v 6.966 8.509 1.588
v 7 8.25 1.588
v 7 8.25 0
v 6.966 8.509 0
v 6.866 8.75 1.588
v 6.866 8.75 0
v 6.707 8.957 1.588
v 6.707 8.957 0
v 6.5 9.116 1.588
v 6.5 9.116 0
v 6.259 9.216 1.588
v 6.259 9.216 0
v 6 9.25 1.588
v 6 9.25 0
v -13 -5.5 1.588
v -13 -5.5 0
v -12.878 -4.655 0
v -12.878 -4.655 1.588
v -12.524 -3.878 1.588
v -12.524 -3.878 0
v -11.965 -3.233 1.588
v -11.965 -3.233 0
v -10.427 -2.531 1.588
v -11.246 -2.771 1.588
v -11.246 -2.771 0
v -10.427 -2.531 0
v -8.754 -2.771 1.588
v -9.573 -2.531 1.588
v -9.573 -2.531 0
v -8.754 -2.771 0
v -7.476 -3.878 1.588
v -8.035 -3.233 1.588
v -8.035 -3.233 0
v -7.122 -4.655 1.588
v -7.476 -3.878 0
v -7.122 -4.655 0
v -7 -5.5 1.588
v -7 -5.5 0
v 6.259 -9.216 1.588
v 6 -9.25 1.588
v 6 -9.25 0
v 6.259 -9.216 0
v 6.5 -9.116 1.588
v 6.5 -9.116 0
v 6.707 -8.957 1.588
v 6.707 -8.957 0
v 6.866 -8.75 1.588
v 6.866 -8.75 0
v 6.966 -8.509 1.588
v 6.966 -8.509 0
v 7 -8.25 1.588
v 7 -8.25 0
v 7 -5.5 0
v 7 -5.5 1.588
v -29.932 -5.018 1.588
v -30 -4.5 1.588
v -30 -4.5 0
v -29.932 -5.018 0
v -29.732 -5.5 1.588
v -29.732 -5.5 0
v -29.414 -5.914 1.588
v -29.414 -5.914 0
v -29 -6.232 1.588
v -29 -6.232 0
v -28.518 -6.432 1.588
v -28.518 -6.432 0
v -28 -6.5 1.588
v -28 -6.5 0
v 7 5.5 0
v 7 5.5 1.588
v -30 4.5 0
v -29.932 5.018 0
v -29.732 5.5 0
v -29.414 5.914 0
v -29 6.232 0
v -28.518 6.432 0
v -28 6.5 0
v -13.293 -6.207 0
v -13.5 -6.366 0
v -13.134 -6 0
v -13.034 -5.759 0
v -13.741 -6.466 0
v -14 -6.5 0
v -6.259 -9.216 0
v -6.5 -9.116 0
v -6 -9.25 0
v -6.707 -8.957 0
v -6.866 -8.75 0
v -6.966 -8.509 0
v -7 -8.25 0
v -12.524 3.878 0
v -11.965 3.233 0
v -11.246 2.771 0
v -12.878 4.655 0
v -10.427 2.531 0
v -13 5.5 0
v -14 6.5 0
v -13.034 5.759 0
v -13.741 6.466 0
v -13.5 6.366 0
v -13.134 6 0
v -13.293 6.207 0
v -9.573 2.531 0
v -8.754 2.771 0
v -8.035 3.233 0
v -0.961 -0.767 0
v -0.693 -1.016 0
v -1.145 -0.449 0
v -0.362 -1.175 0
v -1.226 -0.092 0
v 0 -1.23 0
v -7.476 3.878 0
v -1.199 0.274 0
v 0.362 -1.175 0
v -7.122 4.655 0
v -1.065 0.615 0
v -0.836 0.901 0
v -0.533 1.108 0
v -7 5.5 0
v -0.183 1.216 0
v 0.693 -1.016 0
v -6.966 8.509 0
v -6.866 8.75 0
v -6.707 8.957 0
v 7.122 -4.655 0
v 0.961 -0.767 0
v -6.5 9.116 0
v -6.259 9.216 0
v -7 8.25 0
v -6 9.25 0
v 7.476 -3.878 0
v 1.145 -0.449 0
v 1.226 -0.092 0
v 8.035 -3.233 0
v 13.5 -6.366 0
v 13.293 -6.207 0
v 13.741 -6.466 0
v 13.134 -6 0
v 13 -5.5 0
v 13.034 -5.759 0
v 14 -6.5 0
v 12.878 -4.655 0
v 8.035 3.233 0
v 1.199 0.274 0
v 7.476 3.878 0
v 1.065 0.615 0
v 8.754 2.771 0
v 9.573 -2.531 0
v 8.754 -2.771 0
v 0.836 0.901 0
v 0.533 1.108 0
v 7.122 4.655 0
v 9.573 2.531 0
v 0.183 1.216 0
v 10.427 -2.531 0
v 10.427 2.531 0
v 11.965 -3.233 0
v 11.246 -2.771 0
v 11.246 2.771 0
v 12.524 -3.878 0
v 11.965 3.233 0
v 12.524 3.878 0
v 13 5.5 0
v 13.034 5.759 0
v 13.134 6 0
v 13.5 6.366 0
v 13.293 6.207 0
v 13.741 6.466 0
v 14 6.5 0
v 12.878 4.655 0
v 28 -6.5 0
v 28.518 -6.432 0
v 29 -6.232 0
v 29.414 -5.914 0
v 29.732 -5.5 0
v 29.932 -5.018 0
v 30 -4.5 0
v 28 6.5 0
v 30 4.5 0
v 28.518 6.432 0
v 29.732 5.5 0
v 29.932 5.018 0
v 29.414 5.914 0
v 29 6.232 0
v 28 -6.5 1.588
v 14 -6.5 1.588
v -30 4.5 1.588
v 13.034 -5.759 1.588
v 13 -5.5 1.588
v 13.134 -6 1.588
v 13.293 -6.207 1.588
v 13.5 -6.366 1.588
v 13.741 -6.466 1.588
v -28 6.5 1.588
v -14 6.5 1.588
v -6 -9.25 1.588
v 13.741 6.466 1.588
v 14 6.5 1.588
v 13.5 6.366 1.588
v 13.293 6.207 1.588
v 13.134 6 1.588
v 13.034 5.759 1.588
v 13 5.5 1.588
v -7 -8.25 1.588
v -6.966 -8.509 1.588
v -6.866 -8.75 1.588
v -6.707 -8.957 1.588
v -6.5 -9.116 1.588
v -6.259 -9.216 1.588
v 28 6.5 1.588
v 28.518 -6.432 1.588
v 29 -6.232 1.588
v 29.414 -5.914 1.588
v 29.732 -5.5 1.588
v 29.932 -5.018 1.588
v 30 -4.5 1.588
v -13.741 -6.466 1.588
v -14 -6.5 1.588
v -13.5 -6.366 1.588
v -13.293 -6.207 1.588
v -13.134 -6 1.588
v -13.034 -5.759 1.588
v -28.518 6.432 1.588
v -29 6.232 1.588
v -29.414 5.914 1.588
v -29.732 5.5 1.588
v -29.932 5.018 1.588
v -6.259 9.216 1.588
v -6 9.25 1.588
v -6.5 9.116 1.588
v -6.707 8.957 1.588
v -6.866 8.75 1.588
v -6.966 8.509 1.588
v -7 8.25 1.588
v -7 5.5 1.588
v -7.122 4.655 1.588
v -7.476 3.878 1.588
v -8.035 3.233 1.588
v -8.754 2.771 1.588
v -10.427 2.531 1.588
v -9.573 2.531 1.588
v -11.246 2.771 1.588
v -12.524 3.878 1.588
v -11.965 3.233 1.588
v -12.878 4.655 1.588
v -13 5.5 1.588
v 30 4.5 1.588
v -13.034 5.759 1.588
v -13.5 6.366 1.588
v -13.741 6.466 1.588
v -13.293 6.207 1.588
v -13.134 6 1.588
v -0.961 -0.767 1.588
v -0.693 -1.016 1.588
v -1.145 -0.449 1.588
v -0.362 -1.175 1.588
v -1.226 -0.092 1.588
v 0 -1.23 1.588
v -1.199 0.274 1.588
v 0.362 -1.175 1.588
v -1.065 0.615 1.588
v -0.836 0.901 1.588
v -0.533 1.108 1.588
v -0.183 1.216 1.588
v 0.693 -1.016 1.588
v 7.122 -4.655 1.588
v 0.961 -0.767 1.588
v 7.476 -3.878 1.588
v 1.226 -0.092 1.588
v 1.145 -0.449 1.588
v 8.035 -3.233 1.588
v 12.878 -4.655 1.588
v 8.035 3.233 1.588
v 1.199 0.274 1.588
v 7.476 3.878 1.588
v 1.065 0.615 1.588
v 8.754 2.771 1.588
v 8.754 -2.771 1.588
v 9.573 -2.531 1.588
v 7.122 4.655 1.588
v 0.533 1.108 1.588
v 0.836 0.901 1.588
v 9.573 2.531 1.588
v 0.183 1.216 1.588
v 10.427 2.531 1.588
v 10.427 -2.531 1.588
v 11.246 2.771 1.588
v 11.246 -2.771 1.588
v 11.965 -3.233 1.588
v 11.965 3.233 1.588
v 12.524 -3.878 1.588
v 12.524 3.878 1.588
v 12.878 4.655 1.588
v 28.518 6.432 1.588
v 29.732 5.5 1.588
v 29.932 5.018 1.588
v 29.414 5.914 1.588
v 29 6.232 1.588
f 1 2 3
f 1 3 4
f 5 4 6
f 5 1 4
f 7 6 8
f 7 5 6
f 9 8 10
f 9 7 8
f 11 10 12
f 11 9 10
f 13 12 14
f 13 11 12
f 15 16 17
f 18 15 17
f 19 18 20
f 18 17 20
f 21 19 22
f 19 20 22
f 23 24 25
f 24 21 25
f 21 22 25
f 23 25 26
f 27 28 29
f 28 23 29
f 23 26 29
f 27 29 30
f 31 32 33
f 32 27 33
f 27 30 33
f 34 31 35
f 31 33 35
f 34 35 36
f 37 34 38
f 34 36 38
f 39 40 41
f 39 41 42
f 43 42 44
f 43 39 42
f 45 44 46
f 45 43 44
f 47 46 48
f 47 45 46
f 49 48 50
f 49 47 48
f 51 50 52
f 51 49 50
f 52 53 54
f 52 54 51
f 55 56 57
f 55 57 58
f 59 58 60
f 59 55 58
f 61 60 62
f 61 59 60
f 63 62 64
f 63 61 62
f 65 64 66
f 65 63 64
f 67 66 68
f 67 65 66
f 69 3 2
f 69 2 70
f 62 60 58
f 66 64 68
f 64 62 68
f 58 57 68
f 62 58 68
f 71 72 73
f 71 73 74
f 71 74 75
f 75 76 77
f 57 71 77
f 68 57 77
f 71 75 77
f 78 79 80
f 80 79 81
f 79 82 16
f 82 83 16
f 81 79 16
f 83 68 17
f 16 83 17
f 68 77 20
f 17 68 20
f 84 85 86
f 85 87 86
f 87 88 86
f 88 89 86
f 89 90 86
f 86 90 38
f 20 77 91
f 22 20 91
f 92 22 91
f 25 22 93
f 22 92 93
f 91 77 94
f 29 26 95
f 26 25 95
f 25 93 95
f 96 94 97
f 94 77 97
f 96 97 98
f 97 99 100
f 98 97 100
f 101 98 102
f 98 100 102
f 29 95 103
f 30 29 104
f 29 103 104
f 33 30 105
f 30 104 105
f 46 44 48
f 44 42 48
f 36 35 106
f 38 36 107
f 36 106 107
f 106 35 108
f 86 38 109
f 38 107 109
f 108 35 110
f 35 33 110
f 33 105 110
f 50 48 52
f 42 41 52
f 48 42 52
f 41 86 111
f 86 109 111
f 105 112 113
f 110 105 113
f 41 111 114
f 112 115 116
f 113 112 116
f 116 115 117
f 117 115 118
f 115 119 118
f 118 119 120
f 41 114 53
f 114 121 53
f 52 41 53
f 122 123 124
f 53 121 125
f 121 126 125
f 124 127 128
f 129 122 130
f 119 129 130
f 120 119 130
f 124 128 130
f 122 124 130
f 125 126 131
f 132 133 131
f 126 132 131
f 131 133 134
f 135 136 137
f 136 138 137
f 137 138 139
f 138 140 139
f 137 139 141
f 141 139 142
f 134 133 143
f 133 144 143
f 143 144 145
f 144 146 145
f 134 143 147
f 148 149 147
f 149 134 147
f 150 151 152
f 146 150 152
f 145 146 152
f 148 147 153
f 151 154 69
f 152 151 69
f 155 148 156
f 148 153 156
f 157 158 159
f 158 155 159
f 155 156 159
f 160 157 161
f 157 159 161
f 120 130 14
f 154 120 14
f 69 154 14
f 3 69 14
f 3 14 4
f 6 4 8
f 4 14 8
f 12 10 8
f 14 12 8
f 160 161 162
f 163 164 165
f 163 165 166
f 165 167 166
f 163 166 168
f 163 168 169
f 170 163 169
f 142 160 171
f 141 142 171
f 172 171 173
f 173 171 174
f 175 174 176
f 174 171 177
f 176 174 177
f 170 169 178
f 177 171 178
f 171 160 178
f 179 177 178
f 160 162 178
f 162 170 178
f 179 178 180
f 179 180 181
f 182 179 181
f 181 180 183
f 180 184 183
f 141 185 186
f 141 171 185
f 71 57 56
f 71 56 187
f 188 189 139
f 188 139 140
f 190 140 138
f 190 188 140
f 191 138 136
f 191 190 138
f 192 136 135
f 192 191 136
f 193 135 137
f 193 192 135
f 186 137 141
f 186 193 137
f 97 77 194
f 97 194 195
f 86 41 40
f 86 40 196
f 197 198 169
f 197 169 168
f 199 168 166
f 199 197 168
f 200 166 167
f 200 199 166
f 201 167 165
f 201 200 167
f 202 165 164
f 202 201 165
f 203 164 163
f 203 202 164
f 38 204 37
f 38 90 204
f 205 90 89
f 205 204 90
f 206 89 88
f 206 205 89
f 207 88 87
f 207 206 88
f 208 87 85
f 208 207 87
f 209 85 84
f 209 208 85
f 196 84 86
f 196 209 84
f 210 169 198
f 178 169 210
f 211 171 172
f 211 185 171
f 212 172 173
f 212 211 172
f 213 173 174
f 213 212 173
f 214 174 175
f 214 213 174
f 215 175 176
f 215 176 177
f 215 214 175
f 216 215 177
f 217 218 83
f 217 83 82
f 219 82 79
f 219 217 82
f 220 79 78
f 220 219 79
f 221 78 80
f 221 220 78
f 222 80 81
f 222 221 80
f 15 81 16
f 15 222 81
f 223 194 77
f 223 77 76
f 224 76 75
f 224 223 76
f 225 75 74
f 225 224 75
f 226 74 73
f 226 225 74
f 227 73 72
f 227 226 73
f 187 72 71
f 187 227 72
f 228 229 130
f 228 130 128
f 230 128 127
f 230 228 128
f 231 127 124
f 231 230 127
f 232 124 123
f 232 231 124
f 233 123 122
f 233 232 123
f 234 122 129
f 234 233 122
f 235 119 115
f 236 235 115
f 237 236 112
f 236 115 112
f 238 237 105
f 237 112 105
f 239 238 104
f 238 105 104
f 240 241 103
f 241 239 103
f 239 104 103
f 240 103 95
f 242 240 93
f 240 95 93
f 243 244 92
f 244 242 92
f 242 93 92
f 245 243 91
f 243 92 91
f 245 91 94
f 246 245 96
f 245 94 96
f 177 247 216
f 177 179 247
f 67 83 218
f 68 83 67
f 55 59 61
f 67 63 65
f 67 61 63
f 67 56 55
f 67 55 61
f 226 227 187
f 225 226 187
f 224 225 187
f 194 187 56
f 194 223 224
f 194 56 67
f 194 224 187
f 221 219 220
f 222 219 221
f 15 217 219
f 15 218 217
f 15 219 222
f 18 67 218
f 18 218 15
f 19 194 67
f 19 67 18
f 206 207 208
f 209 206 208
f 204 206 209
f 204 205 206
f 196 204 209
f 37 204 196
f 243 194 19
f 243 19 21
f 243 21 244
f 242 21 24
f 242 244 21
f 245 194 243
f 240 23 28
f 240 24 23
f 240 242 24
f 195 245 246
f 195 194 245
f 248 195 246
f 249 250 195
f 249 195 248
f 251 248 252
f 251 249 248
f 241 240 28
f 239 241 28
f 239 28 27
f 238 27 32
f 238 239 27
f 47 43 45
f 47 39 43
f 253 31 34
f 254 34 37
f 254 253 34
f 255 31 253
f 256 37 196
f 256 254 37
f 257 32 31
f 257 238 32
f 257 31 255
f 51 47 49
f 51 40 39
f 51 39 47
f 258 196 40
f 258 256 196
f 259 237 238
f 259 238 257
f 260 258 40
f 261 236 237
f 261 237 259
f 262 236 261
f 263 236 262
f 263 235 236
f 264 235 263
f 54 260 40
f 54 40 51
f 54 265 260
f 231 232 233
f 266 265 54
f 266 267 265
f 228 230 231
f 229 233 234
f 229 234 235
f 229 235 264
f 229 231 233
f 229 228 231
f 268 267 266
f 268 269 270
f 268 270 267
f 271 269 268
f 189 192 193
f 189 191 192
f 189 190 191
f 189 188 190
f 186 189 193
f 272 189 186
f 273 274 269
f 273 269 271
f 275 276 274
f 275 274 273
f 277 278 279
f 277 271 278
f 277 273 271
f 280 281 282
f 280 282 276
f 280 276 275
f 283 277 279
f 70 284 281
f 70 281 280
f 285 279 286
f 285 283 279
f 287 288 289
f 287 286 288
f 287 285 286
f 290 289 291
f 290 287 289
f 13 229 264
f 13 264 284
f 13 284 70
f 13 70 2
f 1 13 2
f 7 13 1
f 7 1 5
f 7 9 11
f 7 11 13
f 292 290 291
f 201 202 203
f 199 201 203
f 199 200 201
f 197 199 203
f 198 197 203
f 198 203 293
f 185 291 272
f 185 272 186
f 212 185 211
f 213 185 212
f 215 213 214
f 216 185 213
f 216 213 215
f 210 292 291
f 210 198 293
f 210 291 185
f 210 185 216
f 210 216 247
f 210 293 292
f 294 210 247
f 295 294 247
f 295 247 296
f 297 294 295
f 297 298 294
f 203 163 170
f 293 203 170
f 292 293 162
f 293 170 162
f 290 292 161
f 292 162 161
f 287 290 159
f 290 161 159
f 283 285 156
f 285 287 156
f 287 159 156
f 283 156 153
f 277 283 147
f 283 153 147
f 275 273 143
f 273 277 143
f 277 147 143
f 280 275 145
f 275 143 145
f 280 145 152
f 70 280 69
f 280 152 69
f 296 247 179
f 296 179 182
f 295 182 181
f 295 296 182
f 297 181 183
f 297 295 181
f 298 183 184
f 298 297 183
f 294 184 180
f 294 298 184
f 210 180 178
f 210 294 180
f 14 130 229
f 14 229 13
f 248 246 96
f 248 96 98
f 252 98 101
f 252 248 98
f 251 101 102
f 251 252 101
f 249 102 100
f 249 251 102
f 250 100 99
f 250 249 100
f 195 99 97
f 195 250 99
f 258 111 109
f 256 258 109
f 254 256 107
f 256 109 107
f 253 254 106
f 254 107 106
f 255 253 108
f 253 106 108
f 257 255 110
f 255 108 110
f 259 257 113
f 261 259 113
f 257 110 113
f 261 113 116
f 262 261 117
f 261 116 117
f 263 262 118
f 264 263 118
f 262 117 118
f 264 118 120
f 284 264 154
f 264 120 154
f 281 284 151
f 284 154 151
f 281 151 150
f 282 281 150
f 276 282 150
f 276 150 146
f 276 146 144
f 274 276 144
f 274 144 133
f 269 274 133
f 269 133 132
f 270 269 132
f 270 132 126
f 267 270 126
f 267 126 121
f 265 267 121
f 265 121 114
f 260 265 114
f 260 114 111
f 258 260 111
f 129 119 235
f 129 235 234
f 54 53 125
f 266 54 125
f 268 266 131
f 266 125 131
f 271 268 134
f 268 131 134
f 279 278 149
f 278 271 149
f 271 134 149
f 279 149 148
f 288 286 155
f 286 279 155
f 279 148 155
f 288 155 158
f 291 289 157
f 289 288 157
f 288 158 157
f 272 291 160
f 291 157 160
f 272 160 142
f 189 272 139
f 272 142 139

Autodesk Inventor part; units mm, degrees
ref_plane "YZ Plane" through (0, 0, 0) normal (1, 0, 0) x (0, 1, 0)
ref_plane "XZ Plane" through (0, 0, 0) normal (0, 1, 0) x (-1, 0, 0)
ref_plane "XY Plane" through (0, 0, 0) normal (0, 0, 1) x (1, 0, 0)
sketch "Sketch1" plane through (0, 0, 0) normal (0, 0, 1) x (1, 0, 0)
  line L0 (13.75, -9.25) -> (-13.75, -9.25)
  line L1 (-13.75, -9.25) -> (-13.75, 9.25)
  line L2 (-13.75, 9.25) -> (13.75, 9.25)
  line L3 (13.75, 9.25) -> (13.75, -9.25)
  line L4 (13.75, -9.25) -> (-13.75, 9.25) construction
  line L5 (-13.75, -9.25) -> (13.75, 9.25) construction
  line L6 (-16, 0) -> (16, 0) construction
  circle A0 centre (-16, 0) radius 4
  circle A1 centre (16, 0) radius 4
  line L7 (30, -1) -> (-30, -1)
  line L8 (-30, -1) -> (-30, 1)
  line L9 (-30, 1) -> (30, 1)
  line L10 (30, 1) -> (30, -1)
  line L11 (30, -1) -> (-30, 1) construction
  line L12 (-30, -1) -> (30, 1) construction
  line L13 (30, -6.5) -> (-30, -6.5)
  line L14 (-30, -6.5) -> (-30, 6.5)
  line L15 (-30, 6.5) -> (30, 6.5)
  line L16 (30, 6.5) -> (30, -6.5)
  line L17 (30, -6.5) -> (-30, 6.5) construction
  line L18 (-30, -6.5) -> (30, 6.5) construction
  line L19 (10, -5.5) -> (-10, -5.5) construction
  line L20 (-10, -5.5) -> (-10, 5.5) construction
  line L21 (-10, 5.5) -> (10, 5.5) construction
  line L22 (10, 5.5) -> (10, -5.5) construction
  line L23 (10, -5.5) -> (-10, 5.5) construction
  line L24 (-10, -5.5) -> (10, 5.5) construction
  circle A2 centre (-10, 5.5) radius 3
  circle A3 centre (10, 5.5) radius 3
  circle A4 centre (10, -5.5) radius 3
  circle A5 centre (-10, -5.5) radius 3
  line L25 (7, -9.25) -> (-7, -9.25)
  line L26 (-7, -9.25) -> (-7, 9.25)
  line L27 (-7, 9.25) -> (7, 9.25)
  line L28 (7, 9.25) -> (7, -9.25)
  line L29 (7, -9.25) -> (-7, 9.25) construction
  line L30 (-7, -9.25) -> (7, 9.25) construction
  line L31 (13, -9.25) -> (-13, -9.25)
  line L32 (-13, -9.25) -> (-13, 9.25)
  line L33 (-13, 9.25) -> (13, 9.25)
  line L34 (13, 9.25) -> (13, -9.25)
  line L35 (13, -9.25) -> (-13, 9.25) construction
  line L36 (-13, -9.25) -> (13, 9.25) construction
  point P0 (0, 0)
  point P1 (-19.873, -1)
  point P2 (-13.75, -6.5)
  point P3 (13.75, -6.5)
  point P4 (19.873, -1)
  point P5 (19.873, 1)
  point P6 (13.75, 6.5)
  point P7 (-13.75, 6.5)
  point P8 (-19.873, 1)
  point P9 (-13, -6.5)
  point P10 (-13, -5.5)
  point P11 (-7, -5.5)
  point P12 (7, -5.5)
  point P13 (13, -5.5)
  point P14 (13, -6.5)
  point P15 (13, 6.5)
  point P16 (13, 5.5)
  point P17 (7, 5.5)
  point P18 (-7, 5.5)
  point P19 (-13, 5.5)
  point P20 (-13, 6.5)
  dimension "d0" = 27.5
  dimension "d1" = 18.5
  dimension "d2" = 8
  dimension "d3" = 8
  dimension "d4" = 32
  dimension "d5" = 60
  dimension "d6" = 2
  dimension "d7" = 13
  dimension "d35" = 20
  dimension "d36" = 11
  dimension "d37" = 6
extrude "Extrusion1" add sketch "Sketch1" along normal blind 1.5875 contours L13 L34 A1 L3 | L3 A1 L7 L16 L13 | L0 L26 L13 L28 | A1 L34 L7 L3 | L3 L7 A1 | L13 L26 L7 L28 | A4 L28 L7 A1 L34 | L7 L34 L9 L3 | L3 L9 A1 L7 | A1 L7 L34 | A1 L9 L10 L7 | L9 L34 A1 L3 | L3 A1 L9 | L7 A1 L9 L34 | L7 L28 L9 A1 | L9 A1 L3 L15 L16 | L13 L1 A0 L32 | A5 L32 A0 L7 L26 | L7 L26 L9 L28 | A1 L34 L15 L3 | L9 A1 L34 | L9 L28 A3 L34 A1 | L13 L14 L7 A0 L1 | L7 A0 L9 L26 | L9 L26 L15 L28 | A0 L7 L1 | L1 L7 L32 A0 | L32 L7 A0 | L7 L32 L9 A0 | L9 A0 L32 A2 L26 | L7 A0 L9 L1 | L1 L9 L32 L7 | L7 L8 L9 A0 | L9 L32 A0 | L15 L26 L2 L28 | L9 A0 L1 | L1 A0 L32 L9 | L9 L14 L15 L1 A0 | A0 L1 L15 L32
fillet "Fillet2" radius 2 4 edges at (-30, 6.5, 0.7937) (-30, -6.5, 0.7937) (30, 6.5, 0.7937) (30, -6.5, 0.7937)
fillet "Fillet5" radius 1 8 edges at (-7, 9.25, 0.7937) (-7, -9.25, 0.7937) (-13, 6.5, 0.7937) (-13, -6.5, 0.7937) (13, -6.5, 0.7937) (13, 6.5, 0.7937) (7, 9.25, 0.7937) (7, -9.25, 0.7937)
sketch "Sketch3" plane through (0, 0, 1.5875) normal (0, 0, 1) x (1, 0, 0)
  point P0 (0, 0)
hole "Hole2" at (0, 0, 1.5875) direction (0, 0, -1) diameter 2.459 end through all thread size "M3x0.5" class "6H" standard "ANSI Metric M Profile"
properties part number "Printhead Belt Retainer Cap" material "Aluminum 6061"
